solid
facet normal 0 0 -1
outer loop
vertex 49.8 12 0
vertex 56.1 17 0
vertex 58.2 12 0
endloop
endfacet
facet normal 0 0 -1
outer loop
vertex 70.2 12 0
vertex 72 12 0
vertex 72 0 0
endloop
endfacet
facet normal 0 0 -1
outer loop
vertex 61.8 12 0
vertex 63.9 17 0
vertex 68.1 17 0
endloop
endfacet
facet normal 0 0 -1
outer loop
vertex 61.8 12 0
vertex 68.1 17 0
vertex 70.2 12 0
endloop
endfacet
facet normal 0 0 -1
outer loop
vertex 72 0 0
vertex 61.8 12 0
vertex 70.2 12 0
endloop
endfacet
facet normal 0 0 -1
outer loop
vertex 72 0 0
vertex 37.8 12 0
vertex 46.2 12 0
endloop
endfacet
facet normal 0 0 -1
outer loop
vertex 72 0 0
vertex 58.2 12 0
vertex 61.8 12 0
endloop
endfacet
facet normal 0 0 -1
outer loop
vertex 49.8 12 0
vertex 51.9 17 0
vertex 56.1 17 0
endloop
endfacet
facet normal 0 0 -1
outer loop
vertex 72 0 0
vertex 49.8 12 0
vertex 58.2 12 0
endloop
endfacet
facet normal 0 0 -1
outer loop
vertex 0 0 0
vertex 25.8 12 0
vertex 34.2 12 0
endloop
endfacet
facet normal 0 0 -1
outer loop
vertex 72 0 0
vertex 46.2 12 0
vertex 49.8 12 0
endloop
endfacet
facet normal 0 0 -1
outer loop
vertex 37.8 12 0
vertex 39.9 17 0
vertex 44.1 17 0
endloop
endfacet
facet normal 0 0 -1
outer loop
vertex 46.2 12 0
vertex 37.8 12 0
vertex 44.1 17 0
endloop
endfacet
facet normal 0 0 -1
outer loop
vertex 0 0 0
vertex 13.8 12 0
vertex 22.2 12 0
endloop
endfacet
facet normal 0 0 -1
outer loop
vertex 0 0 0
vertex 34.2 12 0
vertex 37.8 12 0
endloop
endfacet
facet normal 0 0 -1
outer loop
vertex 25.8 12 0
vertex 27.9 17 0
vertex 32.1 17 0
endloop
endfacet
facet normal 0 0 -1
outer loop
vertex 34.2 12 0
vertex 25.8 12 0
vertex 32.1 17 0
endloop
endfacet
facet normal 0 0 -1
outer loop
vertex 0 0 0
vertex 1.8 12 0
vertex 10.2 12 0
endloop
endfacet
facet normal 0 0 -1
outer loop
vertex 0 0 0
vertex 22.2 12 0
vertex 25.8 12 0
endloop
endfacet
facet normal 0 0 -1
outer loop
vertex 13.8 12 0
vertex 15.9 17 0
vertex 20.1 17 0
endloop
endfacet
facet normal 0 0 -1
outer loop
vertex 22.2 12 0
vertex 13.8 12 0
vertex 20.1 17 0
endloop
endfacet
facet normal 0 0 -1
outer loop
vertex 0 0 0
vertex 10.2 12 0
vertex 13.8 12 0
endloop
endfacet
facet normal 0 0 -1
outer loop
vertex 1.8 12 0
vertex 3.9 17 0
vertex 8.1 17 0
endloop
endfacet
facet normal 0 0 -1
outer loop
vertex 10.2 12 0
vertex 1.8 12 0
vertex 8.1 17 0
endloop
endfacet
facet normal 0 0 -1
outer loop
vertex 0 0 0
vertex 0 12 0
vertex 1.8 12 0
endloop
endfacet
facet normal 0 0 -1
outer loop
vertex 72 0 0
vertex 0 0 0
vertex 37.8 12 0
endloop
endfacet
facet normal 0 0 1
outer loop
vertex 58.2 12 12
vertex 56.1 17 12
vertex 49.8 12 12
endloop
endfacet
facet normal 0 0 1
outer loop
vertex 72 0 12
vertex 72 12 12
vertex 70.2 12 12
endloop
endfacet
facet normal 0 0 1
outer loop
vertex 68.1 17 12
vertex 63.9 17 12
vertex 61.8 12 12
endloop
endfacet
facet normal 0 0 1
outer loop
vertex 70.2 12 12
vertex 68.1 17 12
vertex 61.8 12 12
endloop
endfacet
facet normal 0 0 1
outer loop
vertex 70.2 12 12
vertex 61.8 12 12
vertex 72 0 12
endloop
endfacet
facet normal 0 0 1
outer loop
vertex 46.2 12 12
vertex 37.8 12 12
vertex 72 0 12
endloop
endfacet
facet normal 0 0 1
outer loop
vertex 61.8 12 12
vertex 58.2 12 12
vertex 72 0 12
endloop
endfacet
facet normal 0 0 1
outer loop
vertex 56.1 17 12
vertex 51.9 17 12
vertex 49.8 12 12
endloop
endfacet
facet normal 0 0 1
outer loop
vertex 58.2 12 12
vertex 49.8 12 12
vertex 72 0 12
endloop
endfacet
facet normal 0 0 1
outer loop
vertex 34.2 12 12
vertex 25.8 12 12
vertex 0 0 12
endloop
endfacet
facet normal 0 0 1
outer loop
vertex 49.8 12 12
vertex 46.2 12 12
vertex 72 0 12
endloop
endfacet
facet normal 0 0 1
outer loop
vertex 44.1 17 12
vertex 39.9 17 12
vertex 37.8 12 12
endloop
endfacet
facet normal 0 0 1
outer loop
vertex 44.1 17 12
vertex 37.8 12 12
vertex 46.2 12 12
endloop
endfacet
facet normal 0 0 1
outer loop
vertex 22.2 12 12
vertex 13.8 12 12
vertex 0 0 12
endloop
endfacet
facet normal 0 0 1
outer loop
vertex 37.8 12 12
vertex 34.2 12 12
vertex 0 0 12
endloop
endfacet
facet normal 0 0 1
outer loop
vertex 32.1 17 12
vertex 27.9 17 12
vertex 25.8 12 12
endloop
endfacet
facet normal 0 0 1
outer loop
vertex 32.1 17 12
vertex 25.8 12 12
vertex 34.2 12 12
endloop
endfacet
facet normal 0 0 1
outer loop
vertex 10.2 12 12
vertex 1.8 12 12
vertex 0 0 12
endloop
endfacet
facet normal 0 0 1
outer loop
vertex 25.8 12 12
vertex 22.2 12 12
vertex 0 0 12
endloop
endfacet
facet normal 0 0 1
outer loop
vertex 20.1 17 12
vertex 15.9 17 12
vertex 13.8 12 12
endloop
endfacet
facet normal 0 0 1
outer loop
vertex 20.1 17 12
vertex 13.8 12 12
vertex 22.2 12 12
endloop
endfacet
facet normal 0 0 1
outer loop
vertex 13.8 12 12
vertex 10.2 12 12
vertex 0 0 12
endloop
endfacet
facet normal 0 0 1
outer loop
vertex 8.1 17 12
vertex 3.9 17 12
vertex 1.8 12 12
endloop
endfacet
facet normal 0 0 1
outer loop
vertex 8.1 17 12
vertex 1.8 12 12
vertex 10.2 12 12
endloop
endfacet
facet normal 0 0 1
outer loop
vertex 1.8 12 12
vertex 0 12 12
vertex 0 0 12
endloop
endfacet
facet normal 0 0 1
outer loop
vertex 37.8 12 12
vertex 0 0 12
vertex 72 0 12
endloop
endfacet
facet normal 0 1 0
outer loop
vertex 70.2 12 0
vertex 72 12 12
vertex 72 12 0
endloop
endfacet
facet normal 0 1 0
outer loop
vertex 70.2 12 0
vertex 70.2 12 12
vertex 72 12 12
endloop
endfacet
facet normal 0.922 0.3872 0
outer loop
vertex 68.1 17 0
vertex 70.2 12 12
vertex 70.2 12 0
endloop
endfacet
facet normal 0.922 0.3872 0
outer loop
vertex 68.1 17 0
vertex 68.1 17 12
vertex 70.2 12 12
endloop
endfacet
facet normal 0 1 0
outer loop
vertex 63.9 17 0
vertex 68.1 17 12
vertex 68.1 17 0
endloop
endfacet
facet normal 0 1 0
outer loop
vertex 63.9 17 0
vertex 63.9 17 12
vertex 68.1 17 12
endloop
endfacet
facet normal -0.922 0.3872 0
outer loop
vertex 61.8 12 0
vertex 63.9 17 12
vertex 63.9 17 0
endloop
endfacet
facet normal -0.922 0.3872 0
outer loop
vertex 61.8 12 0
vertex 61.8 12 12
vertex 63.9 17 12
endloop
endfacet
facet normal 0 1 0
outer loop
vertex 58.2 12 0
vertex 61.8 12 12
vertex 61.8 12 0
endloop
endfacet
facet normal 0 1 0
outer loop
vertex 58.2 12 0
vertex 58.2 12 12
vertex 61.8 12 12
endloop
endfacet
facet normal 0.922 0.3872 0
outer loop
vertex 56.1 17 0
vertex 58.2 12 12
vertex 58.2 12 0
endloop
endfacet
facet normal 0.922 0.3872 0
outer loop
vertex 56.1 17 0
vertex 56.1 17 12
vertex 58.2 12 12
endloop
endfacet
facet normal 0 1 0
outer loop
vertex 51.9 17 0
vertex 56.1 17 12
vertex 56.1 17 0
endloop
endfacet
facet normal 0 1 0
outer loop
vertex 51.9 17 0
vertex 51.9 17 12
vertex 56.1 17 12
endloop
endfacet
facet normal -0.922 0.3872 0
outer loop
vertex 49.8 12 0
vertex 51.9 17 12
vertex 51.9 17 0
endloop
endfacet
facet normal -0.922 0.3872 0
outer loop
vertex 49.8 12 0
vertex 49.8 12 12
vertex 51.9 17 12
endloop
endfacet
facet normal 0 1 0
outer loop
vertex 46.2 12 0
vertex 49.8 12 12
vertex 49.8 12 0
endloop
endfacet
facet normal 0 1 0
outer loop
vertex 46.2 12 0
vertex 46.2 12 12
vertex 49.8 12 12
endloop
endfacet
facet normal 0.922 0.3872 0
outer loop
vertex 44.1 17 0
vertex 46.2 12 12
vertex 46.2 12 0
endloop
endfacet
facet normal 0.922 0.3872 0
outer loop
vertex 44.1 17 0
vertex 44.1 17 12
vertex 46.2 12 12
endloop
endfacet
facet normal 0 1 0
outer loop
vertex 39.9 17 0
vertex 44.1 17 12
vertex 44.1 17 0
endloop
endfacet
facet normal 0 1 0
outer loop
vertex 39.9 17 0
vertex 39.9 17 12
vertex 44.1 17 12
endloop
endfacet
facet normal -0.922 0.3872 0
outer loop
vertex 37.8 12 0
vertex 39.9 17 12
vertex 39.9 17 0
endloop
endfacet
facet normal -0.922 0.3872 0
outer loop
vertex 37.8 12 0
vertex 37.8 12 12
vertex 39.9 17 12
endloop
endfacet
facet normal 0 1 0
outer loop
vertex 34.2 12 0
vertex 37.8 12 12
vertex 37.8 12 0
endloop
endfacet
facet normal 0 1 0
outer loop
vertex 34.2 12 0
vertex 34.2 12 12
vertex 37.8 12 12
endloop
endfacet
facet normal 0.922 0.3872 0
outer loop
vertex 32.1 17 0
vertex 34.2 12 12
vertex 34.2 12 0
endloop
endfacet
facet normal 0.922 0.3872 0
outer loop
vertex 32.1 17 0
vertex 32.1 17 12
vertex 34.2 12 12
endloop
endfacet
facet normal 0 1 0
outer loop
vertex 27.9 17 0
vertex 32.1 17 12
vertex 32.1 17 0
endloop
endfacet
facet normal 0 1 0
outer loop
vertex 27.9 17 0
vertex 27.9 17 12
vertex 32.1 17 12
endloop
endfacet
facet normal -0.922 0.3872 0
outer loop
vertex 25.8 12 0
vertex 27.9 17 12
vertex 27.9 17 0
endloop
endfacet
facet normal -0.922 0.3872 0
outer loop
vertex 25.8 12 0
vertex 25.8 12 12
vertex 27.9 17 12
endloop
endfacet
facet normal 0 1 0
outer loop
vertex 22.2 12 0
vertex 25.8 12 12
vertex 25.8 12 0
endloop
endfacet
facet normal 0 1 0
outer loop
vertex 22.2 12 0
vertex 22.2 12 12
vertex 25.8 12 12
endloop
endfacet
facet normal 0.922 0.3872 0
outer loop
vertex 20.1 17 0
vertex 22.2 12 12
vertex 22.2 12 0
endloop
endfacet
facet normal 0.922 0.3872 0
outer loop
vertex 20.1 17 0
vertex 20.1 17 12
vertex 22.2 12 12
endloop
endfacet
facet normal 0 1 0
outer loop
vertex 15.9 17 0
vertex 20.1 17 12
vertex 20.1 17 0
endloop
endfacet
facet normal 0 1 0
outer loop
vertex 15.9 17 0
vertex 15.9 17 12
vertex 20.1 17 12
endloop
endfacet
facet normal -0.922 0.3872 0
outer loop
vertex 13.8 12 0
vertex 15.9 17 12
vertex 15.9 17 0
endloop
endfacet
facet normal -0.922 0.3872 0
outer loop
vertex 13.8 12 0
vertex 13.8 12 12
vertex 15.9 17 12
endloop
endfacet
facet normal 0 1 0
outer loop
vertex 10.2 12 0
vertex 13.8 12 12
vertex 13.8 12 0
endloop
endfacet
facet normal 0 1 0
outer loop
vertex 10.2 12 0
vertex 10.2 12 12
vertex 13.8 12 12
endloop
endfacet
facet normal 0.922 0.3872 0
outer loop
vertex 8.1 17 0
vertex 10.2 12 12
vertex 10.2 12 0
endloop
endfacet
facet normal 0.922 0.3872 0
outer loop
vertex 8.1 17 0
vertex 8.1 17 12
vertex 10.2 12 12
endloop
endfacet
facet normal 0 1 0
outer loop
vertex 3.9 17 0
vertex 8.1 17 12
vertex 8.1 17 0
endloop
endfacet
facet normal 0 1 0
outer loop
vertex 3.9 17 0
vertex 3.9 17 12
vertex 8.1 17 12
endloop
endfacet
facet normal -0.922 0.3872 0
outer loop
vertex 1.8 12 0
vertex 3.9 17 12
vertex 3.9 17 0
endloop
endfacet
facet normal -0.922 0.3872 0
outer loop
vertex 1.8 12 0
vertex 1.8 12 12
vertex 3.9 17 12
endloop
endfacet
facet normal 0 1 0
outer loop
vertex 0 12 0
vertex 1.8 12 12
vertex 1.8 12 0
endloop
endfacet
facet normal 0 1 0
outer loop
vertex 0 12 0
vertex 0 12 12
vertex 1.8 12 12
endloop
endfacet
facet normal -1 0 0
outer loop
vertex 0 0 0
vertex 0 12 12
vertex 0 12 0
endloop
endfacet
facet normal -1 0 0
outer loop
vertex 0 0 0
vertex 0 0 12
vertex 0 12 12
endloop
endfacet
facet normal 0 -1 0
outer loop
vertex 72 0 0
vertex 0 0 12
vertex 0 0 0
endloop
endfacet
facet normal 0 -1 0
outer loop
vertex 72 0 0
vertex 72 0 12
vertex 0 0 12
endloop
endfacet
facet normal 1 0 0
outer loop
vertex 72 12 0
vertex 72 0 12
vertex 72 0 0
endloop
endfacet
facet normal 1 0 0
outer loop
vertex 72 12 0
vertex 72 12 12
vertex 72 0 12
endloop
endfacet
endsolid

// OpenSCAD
$fn = 32;

// ----------------------------------------------------------------------
// Gear rack: 6 teeth, pitch 12 mm
// ----------------------------------------------------------------------

// --- parameters (mm) ---
teeth = 6;                // number of teeth
pitch = 12;               // tooth pitch, X
root_w = 8.4;             // tooth width at the root
tip_w = 4.2;              // tooth width at the tip
base_h = 12;              // rack body height, Y
tooth_h = 5;              // tooth height above the body
plate_t = 12;             // rack width, Z (extrusion height)

rack_l = teeth * pitch;  // overall length
total_h = base_h + tooth_h;  // overall height

profile = [[0, 0], [72, 0], [72, 12], [70.2, 12], [68.1, 17], [63.9, 17], [61.8, 12], [58.2, 12], [56.1, 17], [51.9, 17], [49.8, 12], [46.2, 12], [44.1, 17], [39.9, 17], [37.8, 12], [34.2, 12], [32.1, 17], [27.9, 17], [25.8, 12], [22.2, 12], [20.1, 17], [15.9, 17], [13.8, 12], [10.2, 12], [8.1, 17], [3.9, 17], [1.8, 12], [0, 12]];  // primary outline, 28 points, counter clockwise

// --- the one profile operation ---
linear_extrude(height = plate_t) polygon(points = profile);
